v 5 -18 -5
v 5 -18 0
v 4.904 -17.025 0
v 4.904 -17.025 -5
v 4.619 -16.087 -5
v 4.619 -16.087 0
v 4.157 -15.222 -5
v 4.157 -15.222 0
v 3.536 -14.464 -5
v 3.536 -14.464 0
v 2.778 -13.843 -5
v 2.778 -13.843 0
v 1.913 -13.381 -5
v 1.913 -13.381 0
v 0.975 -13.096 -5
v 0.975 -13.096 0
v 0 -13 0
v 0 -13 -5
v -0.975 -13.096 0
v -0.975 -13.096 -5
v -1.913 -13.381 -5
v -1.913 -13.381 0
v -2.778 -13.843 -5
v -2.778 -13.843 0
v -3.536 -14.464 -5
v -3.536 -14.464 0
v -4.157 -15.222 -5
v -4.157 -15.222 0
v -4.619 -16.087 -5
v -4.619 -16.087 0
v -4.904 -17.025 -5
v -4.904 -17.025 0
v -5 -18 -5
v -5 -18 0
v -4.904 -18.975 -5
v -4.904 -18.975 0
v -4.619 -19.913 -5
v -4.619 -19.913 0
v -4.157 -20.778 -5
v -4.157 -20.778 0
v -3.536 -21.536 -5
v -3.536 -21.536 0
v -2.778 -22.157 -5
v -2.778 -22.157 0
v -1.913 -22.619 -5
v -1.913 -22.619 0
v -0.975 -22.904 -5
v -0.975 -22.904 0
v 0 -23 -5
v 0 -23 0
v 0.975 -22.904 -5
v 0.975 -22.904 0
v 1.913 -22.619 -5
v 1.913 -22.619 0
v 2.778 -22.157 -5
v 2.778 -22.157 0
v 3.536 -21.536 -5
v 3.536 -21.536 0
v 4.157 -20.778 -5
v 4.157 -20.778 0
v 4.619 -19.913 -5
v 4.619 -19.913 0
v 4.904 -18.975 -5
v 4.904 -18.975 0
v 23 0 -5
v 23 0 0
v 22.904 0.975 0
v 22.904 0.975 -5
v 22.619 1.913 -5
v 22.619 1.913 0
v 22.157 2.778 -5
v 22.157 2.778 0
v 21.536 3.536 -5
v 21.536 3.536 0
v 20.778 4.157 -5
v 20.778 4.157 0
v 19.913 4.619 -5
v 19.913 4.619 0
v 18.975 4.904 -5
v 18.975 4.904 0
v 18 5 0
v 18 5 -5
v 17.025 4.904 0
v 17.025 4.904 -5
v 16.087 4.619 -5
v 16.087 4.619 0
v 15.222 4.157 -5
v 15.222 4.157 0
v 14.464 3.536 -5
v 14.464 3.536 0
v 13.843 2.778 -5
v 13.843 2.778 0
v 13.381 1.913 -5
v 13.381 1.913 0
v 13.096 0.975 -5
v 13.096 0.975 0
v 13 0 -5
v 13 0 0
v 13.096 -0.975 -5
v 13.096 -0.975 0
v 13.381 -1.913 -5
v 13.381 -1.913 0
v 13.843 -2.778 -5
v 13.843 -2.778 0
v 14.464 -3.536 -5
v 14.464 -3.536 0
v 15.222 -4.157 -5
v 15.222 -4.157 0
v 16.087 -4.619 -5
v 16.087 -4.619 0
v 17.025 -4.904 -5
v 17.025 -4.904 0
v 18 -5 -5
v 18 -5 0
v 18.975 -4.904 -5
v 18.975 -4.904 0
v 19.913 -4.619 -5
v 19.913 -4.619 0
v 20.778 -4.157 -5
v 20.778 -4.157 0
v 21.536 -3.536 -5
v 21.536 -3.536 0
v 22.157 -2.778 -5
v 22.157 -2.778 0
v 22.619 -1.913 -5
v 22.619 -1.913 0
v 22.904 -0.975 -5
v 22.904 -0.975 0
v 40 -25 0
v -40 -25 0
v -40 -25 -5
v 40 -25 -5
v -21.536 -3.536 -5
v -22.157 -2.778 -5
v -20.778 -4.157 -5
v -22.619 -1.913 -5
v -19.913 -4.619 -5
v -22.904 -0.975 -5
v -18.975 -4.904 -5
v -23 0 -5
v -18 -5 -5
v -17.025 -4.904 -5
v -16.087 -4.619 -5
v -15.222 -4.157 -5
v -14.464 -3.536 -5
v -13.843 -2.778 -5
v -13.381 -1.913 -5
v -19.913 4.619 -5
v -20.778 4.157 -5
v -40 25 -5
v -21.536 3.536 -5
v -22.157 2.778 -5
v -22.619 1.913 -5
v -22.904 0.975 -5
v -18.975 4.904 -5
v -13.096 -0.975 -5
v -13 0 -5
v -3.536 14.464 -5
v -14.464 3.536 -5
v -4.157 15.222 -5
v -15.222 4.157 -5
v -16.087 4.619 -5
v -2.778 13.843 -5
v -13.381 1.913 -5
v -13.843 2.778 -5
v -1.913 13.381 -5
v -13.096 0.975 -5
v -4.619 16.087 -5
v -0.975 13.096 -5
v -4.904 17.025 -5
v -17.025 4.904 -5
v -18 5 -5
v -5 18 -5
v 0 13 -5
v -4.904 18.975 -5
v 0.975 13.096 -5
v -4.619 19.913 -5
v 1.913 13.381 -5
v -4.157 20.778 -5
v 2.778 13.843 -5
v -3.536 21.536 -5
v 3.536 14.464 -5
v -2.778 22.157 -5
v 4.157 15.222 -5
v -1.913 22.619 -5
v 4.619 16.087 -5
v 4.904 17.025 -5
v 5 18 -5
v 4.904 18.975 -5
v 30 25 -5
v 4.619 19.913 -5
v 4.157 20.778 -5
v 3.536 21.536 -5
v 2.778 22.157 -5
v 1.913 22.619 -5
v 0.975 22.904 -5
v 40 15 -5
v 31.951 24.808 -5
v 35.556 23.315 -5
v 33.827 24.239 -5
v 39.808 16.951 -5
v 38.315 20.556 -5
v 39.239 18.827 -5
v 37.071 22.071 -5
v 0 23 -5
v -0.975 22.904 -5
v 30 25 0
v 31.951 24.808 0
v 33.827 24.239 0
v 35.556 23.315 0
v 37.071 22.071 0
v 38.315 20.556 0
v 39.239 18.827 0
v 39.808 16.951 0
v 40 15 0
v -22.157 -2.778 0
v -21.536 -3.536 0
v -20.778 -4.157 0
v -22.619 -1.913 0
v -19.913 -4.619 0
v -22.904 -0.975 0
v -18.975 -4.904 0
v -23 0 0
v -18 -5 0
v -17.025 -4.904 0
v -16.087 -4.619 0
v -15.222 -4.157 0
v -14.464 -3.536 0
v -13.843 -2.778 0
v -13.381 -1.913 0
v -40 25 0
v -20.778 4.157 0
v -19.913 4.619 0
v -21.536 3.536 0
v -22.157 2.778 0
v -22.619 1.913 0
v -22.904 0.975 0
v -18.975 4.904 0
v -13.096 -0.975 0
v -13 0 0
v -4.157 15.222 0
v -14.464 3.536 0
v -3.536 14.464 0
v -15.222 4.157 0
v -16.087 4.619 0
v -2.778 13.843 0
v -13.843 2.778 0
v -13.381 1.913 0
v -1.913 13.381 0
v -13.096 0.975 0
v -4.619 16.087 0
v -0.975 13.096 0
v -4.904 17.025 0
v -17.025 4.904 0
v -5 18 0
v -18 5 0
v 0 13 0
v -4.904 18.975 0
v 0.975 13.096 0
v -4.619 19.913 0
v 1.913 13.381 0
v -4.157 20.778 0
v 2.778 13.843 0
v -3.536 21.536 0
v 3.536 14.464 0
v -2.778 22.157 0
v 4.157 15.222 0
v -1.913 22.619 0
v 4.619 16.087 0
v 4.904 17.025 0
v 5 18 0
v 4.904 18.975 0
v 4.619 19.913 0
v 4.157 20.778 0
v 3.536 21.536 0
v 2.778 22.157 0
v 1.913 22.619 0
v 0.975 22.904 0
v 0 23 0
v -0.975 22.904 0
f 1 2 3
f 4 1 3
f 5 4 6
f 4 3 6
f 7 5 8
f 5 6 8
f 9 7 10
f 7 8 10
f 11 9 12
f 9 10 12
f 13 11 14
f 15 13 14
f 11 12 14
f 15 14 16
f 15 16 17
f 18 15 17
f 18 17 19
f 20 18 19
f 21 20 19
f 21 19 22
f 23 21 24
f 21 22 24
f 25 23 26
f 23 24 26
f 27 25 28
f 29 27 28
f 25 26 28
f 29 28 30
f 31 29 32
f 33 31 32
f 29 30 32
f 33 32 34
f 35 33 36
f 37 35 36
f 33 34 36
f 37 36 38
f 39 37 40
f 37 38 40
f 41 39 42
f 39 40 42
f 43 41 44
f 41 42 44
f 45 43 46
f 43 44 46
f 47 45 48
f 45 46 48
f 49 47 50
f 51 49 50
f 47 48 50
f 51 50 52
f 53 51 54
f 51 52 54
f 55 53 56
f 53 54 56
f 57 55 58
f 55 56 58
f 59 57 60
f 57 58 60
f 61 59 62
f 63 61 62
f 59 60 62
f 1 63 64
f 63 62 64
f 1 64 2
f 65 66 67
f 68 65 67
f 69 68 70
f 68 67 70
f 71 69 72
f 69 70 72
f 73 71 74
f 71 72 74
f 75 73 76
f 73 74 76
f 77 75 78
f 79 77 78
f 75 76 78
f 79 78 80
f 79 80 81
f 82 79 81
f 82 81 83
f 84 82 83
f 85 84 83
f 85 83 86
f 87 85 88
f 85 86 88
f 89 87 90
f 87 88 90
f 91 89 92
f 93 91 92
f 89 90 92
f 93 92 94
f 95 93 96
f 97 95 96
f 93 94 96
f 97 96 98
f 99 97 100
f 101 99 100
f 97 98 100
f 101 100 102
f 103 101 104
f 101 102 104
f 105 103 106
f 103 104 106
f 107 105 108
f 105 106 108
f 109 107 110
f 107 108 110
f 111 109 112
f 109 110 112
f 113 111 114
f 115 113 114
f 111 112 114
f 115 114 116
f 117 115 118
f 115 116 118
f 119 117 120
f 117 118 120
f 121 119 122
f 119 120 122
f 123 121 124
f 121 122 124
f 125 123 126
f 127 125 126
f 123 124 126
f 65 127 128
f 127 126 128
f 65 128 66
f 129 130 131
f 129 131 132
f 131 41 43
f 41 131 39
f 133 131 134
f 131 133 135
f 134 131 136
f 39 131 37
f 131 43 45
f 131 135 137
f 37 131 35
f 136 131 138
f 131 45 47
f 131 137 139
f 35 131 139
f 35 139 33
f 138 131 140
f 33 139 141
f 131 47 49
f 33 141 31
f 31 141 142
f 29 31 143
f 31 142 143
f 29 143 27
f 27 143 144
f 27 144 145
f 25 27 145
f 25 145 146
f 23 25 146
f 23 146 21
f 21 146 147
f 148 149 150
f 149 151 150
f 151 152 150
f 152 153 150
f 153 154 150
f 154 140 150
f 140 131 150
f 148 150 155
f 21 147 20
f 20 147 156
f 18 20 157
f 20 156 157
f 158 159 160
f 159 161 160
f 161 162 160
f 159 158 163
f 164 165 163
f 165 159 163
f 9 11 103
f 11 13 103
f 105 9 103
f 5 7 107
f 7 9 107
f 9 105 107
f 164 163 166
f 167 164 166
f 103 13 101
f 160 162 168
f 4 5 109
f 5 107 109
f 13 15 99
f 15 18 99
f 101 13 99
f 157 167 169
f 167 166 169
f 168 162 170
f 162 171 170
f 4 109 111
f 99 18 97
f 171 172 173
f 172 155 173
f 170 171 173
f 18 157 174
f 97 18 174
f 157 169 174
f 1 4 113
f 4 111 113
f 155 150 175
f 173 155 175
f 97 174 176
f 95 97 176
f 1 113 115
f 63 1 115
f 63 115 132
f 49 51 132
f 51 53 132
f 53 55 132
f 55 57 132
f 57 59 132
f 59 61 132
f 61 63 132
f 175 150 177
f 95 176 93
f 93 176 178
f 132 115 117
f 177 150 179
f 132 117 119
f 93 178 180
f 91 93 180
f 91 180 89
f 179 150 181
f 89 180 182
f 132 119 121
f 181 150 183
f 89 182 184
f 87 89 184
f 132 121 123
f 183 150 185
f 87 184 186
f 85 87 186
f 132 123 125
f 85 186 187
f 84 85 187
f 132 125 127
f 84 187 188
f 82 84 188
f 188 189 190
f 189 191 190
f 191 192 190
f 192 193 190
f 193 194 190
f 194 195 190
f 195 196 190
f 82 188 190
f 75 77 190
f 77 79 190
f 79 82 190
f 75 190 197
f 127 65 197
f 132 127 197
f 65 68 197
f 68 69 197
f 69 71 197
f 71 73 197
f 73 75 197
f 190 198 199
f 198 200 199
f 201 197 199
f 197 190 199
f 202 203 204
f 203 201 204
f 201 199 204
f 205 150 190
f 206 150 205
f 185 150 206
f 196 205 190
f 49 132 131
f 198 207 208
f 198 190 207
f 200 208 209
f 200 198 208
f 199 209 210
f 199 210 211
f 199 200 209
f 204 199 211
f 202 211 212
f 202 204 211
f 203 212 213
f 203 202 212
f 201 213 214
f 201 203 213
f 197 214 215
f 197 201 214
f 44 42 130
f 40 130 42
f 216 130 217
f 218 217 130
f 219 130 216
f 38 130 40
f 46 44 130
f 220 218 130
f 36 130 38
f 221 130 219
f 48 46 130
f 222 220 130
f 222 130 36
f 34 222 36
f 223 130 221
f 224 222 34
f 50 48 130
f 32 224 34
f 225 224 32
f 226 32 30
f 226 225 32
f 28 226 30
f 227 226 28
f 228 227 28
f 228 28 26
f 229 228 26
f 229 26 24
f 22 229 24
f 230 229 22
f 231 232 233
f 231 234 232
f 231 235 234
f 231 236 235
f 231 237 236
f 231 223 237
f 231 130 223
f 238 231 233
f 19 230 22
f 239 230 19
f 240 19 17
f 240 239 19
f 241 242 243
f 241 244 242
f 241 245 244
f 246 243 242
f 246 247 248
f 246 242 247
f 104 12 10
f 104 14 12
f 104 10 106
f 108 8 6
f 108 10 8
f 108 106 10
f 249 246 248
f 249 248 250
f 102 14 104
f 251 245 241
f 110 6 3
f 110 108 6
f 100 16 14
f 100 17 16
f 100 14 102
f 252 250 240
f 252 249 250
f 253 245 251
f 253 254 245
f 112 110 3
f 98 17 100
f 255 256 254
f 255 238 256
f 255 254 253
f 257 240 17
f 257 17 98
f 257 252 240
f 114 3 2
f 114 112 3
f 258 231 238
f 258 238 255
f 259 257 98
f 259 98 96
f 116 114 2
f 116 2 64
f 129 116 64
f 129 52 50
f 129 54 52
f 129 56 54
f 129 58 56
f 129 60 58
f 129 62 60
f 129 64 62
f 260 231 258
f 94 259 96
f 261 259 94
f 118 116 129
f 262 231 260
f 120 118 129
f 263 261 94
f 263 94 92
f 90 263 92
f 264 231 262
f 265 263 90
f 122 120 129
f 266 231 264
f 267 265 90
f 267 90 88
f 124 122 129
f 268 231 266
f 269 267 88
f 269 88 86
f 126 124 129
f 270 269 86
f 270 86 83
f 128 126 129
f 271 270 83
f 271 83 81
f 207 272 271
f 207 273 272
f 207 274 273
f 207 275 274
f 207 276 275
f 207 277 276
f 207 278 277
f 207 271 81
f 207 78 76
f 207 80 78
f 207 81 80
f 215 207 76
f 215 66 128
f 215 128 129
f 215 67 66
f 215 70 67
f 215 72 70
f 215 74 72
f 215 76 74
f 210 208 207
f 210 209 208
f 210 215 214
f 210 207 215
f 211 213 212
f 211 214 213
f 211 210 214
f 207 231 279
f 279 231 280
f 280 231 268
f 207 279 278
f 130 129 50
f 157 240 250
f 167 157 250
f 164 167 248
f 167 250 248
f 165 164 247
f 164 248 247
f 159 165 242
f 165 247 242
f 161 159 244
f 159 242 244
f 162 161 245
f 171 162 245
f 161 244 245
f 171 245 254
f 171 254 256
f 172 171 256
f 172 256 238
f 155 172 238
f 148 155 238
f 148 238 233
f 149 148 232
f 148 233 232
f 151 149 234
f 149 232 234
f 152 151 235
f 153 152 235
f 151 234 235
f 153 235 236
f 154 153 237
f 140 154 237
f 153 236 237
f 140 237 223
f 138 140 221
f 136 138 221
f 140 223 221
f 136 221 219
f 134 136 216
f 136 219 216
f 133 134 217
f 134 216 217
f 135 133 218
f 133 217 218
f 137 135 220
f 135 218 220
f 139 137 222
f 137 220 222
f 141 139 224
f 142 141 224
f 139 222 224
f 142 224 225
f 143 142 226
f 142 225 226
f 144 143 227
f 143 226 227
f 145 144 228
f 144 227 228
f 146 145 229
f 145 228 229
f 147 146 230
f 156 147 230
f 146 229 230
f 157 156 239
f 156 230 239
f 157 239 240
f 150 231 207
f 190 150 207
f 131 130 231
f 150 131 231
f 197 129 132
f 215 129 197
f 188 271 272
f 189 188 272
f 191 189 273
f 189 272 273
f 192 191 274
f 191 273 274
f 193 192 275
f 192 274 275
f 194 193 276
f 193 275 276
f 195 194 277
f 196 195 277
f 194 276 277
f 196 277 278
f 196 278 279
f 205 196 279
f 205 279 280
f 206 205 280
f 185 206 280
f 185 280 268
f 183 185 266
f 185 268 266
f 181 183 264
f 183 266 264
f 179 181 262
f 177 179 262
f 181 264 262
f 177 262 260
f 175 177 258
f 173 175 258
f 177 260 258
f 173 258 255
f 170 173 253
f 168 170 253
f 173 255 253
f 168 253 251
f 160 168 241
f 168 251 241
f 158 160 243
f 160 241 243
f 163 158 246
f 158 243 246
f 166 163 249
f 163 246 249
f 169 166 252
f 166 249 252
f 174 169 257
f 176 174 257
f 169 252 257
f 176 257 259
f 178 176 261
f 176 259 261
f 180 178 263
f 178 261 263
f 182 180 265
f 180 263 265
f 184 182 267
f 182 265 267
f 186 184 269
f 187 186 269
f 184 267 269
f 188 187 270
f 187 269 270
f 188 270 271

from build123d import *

# Parameters (mm, degrees)
SKETCH2_W           = 80
SKETCH2_H           = 50
BOSS_EXTRUDE1_DEPTH = 5
SKETCH3_R           = 5
CUT_EXTRUDE1_DEPTH  = 5
FILLET1_R           = 10


with BuildPart() as part:
    # Sketch2 → Boss-Extrude1 (new body)
    with BuildSketch(Plane.XY):
        Rectangle(SKETCH2_W, SKETCH2_H)
    extrude(amount=-BOSS_EXTRUDE1_DEPTH)

    # Sketch3 → Cut-Extrude1 (cut)
    with BuildSketch(Plane.XY):
        with Locations((-18, 0)):
            Circle(SKETCH3_R)
        with Locations((0, 18)):
            Circle(SKETCH3_R)
        with Locations((18, 0)):
            Circle(SKETCH3_R)
        with Locations((0, -18)):
            Circle(SKETCH3_R)
    extrude(amount=-CUT_EXTRUDE1_DEPTH, mode=Mode.SUBTRACT)

    # Fillet1
    fillet1_edges = [part.edges().sort_by_distance(p)[0] for p in [
        (40, 25, -2.5),
    ]]
    fillet(fillet1_edges, radius=FILLET1_R)


solid = part.part
